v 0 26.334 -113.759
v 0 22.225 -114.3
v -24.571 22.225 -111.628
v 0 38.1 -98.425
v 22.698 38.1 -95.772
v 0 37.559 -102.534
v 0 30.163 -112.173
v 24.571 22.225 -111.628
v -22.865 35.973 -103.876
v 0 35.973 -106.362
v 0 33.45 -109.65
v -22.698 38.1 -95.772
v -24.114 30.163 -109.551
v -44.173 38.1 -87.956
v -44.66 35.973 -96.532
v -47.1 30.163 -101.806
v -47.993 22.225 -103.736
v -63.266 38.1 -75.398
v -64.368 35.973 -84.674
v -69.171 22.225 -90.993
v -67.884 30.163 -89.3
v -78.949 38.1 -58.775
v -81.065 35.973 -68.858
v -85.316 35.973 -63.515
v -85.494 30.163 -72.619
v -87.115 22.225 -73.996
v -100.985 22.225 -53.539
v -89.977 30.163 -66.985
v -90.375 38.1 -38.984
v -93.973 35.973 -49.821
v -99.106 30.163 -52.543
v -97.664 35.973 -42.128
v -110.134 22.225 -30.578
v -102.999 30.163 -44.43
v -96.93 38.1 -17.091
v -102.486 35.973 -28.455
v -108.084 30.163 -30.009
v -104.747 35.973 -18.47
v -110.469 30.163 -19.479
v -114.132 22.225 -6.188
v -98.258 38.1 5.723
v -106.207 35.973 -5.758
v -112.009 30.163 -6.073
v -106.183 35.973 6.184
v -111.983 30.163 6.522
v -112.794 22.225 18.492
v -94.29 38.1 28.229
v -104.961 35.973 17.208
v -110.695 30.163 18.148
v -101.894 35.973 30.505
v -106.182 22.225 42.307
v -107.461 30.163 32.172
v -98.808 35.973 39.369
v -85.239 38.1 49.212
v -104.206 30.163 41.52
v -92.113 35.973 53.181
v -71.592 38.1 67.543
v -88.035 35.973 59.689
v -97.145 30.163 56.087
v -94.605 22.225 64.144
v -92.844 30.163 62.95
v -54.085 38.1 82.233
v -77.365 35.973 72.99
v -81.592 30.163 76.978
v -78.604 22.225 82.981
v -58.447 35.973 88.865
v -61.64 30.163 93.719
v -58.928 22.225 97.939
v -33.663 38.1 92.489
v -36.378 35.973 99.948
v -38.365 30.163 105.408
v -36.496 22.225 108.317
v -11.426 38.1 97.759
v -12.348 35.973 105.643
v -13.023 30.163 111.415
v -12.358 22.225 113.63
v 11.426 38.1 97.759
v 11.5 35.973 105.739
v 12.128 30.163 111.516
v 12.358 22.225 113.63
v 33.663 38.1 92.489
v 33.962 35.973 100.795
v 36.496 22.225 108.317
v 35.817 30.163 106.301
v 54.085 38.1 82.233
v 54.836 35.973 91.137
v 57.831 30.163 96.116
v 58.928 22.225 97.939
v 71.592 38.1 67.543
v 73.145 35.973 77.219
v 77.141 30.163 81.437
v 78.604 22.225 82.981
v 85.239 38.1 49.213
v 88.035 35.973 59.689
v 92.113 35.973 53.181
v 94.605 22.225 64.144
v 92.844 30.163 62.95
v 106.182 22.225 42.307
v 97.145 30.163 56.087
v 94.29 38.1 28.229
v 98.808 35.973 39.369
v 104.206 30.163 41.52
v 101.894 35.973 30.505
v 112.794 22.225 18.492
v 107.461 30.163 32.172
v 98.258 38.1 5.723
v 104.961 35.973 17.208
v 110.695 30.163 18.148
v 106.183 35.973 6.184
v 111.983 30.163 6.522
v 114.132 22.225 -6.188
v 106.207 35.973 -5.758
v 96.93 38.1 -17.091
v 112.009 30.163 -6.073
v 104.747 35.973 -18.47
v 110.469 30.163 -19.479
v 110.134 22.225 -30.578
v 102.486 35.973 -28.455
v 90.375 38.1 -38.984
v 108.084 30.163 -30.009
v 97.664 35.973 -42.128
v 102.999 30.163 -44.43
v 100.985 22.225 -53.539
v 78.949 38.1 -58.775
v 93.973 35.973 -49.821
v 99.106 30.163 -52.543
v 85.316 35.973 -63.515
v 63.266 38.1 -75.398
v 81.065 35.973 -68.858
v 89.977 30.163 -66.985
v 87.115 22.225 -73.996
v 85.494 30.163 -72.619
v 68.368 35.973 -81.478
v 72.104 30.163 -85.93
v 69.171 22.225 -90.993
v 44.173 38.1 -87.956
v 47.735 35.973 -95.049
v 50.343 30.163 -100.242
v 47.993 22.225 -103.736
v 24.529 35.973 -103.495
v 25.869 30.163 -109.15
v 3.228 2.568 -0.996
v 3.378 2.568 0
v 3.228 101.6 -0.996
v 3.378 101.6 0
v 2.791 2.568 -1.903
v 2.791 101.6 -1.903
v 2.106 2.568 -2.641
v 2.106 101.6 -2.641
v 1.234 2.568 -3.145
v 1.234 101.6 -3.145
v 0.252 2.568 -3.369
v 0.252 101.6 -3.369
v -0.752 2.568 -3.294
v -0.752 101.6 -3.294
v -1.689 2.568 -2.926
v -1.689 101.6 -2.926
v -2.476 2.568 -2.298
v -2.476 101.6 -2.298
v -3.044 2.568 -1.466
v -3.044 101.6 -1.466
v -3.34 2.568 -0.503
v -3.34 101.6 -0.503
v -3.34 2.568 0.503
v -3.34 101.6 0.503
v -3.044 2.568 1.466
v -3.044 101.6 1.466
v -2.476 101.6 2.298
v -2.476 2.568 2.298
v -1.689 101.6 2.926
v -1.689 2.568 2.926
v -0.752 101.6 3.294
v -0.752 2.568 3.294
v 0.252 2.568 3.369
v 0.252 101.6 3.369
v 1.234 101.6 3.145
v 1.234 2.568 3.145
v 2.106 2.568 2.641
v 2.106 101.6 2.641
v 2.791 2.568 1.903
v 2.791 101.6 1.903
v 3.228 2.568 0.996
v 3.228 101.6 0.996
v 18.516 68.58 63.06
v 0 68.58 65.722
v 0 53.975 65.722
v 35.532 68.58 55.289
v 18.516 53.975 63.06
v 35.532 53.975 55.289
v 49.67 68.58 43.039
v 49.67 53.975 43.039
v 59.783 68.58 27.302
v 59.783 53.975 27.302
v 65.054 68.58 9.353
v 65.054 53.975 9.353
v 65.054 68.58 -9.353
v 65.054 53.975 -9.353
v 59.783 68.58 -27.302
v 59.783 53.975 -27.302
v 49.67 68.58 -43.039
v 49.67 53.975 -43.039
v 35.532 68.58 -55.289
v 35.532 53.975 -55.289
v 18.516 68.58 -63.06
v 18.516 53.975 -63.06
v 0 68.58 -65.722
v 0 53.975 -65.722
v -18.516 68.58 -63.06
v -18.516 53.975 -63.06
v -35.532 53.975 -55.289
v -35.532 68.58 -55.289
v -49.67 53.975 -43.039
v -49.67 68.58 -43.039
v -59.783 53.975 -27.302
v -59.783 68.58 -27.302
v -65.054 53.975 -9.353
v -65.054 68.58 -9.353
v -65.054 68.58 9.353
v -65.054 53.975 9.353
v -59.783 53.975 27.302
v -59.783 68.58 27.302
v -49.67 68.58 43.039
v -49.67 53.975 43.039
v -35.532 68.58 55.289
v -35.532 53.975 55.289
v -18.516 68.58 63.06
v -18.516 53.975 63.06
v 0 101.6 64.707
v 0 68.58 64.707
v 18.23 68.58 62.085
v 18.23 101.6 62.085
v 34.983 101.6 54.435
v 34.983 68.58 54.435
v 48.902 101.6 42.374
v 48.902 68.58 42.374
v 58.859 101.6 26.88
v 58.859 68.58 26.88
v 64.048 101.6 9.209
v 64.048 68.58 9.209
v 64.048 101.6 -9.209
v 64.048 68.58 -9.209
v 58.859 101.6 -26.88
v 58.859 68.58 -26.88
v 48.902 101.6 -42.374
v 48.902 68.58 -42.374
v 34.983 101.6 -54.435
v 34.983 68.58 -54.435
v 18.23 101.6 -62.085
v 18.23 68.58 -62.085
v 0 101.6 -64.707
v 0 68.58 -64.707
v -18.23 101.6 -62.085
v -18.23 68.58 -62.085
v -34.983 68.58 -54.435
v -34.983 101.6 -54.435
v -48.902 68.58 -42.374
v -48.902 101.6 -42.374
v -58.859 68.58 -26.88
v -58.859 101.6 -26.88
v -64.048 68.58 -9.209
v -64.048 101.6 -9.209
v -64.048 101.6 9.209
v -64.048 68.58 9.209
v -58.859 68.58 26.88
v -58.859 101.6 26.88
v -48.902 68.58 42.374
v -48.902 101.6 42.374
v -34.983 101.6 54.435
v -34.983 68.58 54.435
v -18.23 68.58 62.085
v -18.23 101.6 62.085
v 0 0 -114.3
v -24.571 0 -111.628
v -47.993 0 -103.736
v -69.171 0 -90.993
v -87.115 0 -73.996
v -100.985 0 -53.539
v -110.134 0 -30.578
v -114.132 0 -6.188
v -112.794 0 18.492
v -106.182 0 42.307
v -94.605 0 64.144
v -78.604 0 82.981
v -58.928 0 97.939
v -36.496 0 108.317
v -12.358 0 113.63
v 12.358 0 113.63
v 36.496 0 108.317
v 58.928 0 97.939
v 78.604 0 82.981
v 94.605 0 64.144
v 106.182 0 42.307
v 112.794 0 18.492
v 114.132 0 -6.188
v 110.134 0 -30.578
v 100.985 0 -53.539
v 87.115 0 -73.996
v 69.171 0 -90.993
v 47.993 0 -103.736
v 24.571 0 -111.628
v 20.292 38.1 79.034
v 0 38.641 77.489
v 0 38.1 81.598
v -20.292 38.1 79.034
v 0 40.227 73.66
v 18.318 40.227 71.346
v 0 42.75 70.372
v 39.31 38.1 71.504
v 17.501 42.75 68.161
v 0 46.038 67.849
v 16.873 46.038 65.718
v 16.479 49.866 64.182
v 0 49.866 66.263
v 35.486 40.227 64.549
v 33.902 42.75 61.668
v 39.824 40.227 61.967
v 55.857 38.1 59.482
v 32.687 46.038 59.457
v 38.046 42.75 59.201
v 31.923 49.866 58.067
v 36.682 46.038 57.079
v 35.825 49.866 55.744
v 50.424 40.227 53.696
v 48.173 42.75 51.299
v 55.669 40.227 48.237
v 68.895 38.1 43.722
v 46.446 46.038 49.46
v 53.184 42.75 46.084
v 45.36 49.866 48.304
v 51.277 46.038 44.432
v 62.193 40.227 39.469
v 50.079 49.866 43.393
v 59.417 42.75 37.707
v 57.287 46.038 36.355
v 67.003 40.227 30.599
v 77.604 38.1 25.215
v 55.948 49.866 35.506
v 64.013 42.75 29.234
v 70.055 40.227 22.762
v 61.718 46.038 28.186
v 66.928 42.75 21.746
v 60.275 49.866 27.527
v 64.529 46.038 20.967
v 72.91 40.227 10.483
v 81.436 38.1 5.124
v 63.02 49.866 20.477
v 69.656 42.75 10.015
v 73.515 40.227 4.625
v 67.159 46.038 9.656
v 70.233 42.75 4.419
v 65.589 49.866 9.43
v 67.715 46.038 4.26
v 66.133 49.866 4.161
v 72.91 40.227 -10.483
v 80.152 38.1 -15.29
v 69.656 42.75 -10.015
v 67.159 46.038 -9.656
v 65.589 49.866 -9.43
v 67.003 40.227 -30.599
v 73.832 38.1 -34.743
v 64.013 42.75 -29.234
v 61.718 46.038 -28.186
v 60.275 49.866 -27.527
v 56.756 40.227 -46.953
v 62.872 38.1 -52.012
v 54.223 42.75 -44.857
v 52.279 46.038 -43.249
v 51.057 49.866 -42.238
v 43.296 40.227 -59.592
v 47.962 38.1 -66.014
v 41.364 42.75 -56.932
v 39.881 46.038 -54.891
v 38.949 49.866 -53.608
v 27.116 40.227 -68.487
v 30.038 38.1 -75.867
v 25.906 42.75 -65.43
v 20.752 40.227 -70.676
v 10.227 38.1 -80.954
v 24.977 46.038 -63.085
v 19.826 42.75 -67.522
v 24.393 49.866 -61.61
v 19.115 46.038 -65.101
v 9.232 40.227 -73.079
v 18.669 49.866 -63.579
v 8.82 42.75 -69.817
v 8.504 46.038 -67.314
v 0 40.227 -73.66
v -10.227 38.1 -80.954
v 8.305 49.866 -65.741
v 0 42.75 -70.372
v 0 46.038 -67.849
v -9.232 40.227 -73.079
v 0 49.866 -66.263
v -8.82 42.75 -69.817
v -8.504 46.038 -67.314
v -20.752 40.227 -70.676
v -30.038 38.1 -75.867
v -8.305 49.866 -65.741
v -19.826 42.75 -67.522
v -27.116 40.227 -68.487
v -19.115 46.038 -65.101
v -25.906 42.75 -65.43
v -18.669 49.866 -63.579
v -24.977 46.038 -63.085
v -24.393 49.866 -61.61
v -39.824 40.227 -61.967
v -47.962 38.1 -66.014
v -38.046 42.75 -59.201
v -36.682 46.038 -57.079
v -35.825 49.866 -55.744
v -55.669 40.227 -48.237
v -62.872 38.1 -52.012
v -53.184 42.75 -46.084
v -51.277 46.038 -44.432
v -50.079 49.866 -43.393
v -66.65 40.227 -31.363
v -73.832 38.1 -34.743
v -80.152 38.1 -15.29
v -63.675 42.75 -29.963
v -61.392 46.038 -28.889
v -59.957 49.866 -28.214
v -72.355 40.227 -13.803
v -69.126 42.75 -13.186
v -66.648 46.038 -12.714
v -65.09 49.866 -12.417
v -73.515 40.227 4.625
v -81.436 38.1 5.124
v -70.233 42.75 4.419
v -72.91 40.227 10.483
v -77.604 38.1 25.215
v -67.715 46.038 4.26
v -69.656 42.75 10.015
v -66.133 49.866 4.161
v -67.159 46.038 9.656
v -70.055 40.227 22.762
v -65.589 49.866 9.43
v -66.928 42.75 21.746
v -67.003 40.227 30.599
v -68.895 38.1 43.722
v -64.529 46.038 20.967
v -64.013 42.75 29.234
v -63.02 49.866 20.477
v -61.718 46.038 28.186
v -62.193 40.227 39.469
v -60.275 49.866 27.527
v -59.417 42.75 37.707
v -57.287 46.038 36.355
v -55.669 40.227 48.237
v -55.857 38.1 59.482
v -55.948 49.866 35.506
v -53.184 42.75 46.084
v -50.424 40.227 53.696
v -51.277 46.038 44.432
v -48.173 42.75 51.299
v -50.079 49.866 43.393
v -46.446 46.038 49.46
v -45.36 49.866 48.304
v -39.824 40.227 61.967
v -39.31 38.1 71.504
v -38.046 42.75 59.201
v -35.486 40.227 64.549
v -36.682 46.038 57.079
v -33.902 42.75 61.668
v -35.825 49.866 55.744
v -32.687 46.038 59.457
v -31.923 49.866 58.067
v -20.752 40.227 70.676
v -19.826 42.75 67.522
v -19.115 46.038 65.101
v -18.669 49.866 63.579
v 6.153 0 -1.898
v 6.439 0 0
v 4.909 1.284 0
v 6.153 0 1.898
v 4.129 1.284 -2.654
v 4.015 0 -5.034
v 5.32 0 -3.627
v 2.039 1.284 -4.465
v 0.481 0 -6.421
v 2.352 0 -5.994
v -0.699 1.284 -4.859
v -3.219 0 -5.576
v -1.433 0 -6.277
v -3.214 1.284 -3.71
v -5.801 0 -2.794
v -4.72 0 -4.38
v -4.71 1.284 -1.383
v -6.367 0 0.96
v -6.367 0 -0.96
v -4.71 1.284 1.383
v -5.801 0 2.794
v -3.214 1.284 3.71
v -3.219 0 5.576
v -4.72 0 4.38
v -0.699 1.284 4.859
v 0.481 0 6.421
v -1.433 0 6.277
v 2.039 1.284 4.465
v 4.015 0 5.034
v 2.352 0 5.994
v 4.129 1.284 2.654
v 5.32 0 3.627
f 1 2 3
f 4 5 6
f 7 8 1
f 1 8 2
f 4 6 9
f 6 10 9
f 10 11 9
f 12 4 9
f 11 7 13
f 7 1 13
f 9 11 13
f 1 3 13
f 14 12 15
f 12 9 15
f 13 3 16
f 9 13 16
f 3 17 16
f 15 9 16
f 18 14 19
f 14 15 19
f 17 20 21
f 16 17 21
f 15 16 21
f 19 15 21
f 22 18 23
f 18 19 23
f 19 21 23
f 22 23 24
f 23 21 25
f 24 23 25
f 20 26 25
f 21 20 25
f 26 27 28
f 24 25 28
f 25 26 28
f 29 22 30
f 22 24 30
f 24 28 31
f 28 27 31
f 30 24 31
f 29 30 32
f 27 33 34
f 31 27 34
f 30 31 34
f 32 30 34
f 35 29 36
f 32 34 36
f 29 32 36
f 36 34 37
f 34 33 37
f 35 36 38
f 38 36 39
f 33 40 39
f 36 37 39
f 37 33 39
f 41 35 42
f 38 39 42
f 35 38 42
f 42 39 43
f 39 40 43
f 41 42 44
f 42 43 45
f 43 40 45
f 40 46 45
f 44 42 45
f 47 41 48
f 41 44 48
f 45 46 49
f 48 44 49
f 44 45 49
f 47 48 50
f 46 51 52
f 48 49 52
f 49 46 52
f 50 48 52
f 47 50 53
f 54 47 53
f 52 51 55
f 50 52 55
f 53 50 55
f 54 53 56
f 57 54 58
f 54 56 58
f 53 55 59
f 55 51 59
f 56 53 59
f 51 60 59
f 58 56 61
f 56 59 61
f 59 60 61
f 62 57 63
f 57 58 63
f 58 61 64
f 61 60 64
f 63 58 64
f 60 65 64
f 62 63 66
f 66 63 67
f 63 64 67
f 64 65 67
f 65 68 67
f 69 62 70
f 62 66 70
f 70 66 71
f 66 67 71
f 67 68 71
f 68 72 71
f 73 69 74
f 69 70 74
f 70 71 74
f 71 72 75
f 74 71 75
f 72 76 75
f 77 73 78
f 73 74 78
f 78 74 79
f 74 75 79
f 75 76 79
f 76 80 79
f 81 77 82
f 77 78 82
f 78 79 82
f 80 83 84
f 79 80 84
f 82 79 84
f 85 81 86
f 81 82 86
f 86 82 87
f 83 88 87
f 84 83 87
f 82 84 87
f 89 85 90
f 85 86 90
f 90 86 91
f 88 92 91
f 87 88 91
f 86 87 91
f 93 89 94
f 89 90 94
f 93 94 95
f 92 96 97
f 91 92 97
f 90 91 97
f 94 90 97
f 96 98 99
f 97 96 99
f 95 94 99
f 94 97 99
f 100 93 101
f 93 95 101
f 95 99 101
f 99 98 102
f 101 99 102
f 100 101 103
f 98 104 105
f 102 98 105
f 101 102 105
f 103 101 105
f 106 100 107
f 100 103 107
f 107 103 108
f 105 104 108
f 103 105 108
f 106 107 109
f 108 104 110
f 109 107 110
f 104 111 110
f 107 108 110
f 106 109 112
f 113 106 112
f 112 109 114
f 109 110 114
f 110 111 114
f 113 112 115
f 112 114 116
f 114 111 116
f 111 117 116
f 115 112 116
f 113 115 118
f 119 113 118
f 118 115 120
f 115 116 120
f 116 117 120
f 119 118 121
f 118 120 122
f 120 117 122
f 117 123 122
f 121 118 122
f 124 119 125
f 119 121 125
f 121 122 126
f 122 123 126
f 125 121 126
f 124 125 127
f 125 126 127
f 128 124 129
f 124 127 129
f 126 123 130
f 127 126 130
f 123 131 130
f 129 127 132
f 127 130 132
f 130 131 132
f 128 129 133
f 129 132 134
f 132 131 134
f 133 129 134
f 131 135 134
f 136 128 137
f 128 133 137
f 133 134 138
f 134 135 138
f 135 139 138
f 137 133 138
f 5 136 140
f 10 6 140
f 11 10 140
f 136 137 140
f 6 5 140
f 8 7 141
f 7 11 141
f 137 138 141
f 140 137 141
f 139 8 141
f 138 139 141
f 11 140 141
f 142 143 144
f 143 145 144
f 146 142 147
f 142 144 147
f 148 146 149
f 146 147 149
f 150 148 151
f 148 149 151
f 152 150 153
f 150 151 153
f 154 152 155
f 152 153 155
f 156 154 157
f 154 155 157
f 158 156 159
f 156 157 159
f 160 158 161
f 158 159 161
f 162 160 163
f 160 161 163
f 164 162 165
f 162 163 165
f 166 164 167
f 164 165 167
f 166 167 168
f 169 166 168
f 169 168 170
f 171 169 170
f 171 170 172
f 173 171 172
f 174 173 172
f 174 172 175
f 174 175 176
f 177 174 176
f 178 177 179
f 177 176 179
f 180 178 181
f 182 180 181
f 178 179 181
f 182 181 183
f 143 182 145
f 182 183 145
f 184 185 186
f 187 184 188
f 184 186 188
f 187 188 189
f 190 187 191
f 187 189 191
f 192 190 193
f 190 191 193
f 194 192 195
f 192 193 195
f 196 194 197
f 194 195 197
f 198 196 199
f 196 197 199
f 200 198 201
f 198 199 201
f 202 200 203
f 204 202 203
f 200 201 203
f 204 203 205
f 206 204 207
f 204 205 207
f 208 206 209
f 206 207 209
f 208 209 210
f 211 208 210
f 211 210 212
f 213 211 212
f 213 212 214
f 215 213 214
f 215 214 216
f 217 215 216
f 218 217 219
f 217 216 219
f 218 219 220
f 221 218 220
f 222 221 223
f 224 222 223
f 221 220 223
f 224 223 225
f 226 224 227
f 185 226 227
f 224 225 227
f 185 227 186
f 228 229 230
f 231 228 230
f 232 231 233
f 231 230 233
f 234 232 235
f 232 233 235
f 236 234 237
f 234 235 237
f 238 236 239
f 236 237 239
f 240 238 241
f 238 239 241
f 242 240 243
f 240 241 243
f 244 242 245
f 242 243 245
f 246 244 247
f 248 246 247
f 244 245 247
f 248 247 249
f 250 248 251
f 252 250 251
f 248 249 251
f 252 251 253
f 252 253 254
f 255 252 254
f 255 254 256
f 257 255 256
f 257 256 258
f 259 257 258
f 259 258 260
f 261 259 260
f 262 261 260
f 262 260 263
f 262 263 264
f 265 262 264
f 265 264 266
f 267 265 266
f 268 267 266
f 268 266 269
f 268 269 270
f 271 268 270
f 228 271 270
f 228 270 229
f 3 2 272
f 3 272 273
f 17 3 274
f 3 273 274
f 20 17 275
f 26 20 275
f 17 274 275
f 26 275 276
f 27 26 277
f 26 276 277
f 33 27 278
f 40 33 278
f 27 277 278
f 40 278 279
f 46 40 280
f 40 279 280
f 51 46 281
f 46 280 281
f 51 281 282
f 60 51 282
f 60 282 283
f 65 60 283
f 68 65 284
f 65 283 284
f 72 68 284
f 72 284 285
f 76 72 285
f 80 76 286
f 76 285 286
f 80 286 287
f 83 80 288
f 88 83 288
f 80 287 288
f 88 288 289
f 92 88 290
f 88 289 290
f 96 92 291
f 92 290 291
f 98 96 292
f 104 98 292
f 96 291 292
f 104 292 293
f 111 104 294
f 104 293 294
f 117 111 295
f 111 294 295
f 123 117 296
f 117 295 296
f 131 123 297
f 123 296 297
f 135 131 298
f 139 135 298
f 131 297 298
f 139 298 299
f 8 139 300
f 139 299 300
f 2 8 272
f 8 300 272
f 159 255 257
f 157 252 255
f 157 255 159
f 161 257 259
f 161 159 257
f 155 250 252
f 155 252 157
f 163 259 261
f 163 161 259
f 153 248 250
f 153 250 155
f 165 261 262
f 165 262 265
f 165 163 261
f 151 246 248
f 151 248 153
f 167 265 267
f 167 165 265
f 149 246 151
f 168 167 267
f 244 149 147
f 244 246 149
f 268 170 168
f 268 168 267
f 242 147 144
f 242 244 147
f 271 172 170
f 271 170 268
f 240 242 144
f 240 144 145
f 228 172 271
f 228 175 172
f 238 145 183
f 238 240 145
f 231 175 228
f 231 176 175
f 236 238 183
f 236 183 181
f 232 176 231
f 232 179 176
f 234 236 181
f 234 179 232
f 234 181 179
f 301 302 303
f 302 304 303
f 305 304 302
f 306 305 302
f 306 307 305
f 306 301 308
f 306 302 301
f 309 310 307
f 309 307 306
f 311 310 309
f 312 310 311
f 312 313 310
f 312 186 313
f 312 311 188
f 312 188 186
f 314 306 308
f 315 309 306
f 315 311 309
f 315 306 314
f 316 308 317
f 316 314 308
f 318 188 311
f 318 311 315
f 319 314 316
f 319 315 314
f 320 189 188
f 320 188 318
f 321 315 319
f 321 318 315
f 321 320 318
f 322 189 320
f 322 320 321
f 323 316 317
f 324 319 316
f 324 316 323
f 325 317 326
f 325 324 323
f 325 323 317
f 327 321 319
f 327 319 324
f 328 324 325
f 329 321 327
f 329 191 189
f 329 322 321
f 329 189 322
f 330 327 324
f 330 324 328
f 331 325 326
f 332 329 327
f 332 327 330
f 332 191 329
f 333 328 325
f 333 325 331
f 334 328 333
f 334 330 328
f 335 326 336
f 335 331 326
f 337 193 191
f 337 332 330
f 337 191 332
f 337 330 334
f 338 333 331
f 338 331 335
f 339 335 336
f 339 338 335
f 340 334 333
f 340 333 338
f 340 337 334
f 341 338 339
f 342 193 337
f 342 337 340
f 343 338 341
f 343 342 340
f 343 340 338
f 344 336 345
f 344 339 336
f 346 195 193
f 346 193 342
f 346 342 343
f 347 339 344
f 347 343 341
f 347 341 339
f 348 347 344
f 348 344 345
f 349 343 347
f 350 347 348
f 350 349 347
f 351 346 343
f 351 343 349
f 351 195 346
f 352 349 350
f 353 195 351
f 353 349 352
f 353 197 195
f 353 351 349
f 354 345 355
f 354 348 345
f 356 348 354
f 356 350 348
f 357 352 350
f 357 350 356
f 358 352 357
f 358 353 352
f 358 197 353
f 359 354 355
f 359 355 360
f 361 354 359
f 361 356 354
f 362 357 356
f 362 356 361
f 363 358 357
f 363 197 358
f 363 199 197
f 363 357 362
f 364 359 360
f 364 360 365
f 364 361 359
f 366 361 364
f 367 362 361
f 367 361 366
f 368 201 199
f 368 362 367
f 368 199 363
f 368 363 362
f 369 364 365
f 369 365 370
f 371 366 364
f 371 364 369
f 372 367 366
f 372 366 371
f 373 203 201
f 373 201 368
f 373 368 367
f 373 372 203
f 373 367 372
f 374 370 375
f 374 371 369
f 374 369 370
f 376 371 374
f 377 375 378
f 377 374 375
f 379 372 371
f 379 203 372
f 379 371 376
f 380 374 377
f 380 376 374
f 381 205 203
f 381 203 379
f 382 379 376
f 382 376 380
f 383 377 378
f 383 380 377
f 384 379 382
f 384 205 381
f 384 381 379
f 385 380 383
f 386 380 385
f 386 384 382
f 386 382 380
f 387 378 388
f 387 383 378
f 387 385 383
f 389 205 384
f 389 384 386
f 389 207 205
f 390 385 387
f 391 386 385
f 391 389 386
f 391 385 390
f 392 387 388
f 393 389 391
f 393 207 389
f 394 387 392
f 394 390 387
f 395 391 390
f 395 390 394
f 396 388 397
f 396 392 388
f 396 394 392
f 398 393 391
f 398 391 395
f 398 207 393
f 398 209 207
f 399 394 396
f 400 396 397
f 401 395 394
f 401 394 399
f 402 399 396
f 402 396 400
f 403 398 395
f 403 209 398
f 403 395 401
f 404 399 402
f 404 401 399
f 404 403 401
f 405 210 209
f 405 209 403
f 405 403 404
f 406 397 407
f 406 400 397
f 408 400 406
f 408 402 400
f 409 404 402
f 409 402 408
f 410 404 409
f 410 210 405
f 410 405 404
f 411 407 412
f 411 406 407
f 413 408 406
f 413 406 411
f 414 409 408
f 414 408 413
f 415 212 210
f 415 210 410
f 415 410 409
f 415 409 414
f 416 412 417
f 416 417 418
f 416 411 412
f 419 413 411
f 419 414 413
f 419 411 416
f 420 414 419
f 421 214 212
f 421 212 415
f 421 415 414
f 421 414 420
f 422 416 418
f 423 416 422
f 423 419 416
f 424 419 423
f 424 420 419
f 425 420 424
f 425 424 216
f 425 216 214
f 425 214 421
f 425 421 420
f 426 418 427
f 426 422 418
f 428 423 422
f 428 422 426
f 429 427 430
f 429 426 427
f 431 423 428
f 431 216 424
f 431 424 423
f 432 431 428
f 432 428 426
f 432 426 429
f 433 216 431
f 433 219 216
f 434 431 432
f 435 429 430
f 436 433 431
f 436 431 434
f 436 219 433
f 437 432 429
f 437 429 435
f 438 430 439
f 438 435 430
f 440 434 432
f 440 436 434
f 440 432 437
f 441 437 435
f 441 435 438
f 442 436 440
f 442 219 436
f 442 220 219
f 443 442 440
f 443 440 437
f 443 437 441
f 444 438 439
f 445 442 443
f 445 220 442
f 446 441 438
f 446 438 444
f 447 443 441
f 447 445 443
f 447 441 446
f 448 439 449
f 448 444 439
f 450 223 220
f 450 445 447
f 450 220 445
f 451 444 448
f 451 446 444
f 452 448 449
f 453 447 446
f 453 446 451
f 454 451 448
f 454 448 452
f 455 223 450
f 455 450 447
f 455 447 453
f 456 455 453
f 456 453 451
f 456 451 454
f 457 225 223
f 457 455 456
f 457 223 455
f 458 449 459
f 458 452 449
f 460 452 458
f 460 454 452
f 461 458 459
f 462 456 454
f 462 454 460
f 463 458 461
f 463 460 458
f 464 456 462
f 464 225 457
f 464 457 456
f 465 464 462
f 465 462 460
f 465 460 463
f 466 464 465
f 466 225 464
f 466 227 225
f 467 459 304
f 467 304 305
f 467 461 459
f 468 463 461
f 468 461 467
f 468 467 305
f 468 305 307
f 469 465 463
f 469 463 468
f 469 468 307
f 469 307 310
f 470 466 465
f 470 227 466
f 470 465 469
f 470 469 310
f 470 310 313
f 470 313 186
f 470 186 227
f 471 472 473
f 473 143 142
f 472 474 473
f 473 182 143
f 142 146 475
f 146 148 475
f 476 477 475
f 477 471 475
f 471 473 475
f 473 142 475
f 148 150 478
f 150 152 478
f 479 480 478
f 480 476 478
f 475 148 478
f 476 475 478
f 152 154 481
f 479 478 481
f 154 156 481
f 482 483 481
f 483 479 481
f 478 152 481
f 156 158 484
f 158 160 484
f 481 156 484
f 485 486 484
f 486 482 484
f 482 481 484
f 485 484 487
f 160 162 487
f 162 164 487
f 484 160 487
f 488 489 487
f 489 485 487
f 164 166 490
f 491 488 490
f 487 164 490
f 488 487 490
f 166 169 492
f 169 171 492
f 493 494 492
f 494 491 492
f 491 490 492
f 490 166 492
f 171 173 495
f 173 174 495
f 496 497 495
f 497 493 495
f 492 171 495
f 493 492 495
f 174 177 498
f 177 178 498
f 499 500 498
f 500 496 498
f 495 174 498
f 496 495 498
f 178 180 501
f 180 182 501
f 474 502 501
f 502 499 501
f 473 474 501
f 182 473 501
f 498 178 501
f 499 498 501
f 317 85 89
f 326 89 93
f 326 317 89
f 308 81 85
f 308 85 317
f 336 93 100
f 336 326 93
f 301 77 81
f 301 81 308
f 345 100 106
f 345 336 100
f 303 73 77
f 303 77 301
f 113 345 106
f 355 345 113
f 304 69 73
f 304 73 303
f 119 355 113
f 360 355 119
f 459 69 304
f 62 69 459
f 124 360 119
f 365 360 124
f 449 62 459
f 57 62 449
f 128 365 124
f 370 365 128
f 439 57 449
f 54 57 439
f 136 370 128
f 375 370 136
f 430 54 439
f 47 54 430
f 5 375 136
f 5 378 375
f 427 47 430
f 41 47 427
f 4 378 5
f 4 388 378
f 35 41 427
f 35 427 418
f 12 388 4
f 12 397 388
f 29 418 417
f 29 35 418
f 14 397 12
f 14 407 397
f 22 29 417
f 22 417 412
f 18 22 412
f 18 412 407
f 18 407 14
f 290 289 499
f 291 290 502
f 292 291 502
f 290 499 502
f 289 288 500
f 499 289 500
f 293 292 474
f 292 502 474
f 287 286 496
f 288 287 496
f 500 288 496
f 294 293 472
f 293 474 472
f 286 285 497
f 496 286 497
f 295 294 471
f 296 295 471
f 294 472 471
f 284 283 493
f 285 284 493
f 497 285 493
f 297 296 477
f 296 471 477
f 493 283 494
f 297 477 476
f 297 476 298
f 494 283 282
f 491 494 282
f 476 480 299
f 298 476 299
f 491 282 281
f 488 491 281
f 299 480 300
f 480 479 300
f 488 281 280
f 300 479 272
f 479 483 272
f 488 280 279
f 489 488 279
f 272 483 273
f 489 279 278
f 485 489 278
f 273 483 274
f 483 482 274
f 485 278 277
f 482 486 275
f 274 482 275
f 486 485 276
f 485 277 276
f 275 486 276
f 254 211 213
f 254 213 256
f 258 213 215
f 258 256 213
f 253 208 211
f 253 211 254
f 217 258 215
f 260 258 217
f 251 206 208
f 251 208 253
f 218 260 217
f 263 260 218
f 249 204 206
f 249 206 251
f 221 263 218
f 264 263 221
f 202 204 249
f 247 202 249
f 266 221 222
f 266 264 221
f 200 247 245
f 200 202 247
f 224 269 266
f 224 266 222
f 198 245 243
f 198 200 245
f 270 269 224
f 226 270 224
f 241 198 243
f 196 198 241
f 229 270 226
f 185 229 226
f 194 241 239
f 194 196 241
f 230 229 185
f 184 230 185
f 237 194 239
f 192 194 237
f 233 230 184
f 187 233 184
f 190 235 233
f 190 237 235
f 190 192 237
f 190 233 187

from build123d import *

# Parameters (mm, degrees)
SKETCH1_R                                           = 114.3
SKETCH1_R_2                                         = 65.7225
BOSS_EXTRUDE1_DEPTH                                 = 38.1
SKETCH1_3_R                                         = 65.7225
SKETCH1_3_R_2                                       = 64.7065
BOSS_EXTRUDE2_DEPTH                                 = 68.58
SKETCH1_4_R                                         = 64.7065
BOSS_EXTRUDE3_DEPTH                                 = 101.6
CSK_FOR_1_4_FLAT_HEAD_MACHINE_SCREW_100_D           = 6.7564
CSK_FOR_1_4_FLAT_HEAD_MACHINE_SCREW_100_CSINK_D     = 12.8778
CSK_FOR_1_4_FLAT_HEAD_MACHINE_SCREW_100_CSINK_ANGLE = 100
FILLET1_R                                           = 15.875
FILLET2_R                                           = 15.875


with BuildPart() as part:
    # Sketch1 → Boss-Extrude1 (new body)
    with BuildSketch(Plane(origin=(0, 0, 0), x_dir=(1, 0, 0), z_dir=(0, 1, 0))):
        Circle(SKETCH1_R)
        Circle(SKETCH1_R_2, mode=Mode.SUBTRACT)
    extrude(amount=BOSS_EXTRUDE1_DEPTH)

    # Sketch1<3> → Boss-Extrude2 (add)
    with BuildSketch(Plane(origin=(0, 0, 0), x_dir=(1, 0, 0), z_dir=(0, 1, 0))):
        Circle(SKETCH1_3_R)
        Circle(SKETCH1_3_R_2, mode=Mode.SUBTRACT)
    extrude(amount=BOSS_EXTRUDE2_DEPTH)

    # Sketch1<4> → Boss-Extrude3 (add)
    with BuildSketch(Plane(origin=(0, 0, 0), x_dir=(1, 0, 0), z_dir=(0, 1, 0))):
        Circle(SKETCH1_4_R)
    extrude(amount=BOSS_EXTRUDE3_DEPTH)

    # CSK for 1/4 Flat Head Machine Screw (100)1 (through all)
    with Locations(Plane(origin=(0, 0, 0), x_dir=(-1, 0, 0), z_dir=(0, -1, 0))):
        with Locations((0, 0)):
            CounterSinkHole(CSK_FOR_1_4_FLAT_HEAD_MACHINE_SCREW_100_D / 2, CSK_FOR_1_4_FLAT_HEAD_MACHINE_SCREW_100_CSINK_D / 2, counter_sink_angle=CSK_FOR_1_4_FLAT_HEAD_MACHINE_SCREW_100_CSINK_ANGLE)

    # Fillet1
    fillet1_edges = [part.edges().sort_by_distance(p)[0] for p in [
        (-65.7225, 38.1, 0),
    ]]
    fillet(fillet1_edges, radius=FILLET1_R)

    # Fillet2
    fillet2_edges = [part.edges().sort_by_distance(p)[0] for p in [
        (-114.3, 38.1, 0),
    ]]
    fillet(fillet2_edges, radius=FILLET2_R)


solid = part.part
